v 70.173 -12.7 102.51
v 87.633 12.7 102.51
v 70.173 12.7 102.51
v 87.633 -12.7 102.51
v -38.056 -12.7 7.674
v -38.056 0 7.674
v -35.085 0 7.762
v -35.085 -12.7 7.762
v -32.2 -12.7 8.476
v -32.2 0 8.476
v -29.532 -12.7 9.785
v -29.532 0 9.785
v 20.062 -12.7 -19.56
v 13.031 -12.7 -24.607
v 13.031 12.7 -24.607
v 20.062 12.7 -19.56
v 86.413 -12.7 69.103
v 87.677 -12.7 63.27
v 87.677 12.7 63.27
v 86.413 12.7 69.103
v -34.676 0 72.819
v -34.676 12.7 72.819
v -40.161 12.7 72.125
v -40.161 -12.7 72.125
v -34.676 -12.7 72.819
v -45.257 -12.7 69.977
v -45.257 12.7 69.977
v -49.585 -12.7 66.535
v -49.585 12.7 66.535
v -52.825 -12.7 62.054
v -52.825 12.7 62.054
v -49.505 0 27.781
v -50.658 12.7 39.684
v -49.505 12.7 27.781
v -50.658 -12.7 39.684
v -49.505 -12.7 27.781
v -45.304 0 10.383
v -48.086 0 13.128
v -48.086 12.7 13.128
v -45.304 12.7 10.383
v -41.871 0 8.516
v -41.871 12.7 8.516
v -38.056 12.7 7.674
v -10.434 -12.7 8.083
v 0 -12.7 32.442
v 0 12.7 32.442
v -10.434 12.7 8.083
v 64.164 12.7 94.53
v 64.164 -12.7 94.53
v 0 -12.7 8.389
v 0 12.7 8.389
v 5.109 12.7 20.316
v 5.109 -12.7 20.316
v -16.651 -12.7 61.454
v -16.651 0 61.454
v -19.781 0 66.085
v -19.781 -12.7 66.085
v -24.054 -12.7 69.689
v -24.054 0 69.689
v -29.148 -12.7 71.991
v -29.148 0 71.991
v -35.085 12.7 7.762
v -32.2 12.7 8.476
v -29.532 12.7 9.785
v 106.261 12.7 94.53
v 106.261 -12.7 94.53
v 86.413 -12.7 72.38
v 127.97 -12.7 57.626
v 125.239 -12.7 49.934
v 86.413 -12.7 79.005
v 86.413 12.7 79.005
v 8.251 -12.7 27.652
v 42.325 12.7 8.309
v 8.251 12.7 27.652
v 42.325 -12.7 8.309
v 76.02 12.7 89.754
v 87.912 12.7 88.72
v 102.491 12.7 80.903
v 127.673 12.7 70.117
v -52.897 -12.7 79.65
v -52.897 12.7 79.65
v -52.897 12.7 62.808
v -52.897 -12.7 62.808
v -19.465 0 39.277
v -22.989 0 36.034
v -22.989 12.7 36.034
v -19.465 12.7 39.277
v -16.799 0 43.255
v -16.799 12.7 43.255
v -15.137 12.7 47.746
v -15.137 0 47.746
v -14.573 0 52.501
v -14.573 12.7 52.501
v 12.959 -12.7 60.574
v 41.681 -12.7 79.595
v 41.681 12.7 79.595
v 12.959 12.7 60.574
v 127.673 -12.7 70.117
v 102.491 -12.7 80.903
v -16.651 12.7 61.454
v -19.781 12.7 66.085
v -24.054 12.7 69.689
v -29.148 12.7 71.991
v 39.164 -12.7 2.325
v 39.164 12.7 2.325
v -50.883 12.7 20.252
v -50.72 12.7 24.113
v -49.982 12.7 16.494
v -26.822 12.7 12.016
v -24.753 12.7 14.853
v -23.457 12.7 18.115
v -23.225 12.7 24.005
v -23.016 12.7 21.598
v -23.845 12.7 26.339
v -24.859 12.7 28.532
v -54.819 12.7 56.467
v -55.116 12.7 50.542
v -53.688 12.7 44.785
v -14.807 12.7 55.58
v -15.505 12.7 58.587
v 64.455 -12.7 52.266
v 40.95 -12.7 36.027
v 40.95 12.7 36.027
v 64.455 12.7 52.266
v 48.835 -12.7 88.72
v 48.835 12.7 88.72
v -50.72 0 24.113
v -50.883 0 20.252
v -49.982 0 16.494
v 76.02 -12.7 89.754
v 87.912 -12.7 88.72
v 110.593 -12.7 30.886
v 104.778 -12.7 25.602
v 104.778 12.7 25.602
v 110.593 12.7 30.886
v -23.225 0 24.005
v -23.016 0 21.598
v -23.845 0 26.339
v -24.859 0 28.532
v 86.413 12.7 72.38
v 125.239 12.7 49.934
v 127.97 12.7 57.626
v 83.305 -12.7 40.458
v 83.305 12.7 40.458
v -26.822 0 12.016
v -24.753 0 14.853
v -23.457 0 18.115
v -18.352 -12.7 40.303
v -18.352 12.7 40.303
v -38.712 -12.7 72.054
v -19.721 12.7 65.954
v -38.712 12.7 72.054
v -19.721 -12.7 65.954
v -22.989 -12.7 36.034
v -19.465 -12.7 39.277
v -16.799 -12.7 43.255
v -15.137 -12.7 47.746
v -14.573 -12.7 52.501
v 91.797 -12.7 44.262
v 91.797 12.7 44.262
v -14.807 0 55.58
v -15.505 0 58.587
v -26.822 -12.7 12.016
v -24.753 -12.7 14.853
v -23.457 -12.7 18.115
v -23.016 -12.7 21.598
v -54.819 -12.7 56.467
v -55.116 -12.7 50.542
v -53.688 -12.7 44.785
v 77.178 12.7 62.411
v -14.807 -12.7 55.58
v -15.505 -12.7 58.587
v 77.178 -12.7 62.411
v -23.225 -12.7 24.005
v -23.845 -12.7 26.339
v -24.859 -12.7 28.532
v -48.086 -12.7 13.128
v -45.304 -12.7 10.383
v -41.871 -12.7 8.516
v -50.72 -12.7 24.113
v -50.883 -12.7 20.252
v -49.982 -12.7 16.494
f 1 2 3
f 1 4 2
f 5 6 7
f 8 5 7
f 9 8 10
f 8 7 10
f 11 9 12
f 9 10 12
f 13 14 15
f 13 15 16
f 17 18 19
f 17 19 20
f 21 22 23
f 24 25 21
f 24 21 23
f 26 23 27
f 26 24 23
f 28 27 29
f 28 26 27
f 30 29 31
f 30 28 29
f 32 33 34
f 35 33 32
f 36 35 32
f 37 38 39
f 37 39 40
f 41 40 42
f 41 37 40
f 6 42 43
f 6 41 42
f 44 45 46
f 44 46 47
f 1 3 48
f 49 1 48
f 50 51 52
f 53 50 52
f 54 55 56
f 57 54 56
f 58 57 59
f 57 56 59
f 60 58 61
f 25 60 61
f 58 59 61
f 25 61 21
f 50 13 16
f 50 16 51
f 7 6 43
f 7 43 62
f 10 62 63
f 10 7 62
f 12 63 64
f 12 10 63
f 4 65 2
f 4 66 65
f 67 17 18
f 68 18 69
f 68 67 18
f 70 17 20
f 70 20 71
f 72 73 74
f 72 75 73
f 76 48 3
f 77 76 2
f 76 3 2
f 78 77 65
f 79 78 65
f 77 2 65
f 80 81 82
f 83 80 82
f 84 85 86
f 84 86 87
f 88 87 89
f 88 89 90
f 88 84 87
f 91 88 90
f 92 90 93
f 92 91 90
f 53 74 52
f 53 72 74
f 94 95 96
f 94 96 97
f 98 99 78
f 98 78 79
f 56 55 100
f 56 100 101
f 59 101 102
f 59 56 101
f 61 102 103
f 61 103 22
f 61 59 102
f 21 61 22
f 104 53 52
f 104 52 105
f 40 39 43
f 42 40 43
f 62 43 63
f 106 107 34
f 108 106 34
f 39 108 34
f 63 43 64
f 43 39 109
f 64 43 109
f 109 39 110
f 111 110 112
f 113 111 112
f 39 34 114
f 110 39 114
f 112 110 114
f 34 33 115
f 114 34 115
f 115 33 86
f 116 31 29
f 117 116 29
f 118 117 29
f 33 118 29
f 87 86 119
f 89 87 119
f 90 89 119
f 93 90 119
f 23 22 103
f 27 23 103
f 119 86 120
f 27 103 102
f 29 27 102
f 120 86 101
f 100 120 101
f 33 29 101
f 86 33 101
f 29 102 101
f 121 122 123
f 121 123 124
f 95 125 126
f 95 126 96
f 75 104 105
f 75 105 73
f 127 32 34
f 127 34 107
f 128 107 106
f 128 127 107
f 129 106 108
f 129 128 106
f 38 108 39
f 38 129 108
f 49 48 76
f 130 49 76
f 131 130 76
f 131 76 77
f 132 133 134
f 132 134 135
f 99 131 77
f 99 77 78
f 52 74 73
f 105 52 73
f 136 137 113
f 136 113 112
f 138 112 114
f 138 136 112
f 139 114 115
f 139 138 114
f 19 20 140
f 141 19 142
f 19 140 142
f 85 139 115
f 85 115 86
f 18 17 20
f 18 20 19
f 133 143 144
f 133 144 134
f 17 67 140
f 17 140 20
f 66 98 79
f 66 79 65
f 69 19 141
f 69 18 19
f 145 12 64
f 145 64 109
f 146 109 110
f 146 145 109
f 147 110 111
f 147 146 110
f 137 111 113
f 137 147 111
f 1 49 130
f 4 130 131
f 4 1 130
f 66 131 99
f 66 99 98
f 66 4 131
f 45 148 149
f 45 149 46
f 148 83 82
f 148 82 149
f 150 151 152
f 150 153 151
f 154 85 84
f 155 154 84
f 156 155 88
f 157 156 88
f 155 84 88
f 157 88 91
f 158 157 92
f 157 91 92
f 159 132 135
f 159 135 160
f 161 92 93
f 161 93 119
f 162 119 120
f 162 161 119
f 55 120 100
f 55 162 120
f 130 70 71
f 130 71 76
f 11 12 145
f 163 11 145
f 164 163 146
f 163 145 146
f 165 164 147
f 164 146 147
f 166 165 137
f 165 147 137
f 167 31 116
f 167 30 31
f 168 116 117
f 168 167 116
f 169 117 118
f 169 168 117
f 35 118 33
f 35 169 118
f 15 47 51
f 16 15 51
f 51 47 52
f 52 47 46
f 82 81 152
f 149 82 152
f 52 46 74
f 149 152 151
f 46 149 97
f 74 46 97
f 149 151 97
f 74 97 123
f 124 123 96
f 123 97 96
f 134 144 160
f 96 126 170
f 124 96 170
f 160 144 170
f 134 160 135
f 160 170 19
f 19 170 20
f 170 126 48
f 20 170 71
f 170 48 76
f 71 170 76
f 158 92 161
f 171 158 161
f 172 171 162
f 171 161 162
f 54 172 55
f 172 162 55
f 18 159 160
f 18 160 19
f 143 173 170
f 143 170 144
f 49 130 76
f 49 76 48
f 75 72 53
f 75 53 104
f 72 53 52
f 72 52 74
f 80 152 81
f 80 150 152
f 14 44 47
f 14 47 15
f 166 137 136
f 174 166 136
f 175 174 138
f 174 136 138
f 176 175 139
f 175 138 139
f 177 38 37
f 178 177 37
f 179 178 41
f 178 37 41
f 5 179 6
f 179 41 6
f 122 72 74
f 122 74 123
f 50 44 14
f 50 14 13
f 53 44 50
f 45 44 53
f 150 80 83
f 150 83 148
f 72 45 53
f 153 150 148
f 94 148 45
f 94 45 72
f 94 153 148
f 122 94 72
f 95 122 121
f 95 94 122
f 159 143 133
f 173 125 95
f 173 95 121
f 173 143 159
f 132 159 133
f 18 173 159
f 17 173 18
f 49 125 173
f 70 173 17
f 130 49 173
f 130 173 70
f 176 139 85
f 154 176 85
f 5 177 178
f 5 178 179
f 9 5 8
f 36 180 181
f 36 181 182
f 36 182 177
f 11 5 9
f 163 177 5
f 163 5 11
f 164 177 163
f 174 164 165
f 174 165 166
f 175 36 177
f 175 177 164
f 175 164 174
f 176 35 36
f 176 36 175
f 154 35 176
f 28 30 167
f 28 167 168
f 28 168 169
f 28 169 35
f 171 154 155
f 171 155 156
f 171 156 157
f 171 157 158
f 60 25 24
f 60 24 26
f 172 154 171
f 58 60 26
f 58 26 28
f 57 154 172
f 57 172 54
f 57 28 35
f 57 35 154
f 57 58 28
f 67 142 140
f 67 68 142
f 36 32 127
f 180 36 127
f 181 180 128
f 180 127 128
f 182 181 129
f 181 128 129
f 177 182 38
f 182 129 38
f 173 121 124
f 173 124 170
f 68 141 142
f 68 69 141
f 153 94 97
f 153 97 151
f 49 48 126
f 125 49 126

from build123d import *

# Parameters (mm, degrees)
F0_W        = 150.6141573191
F0_H        = 79.405464232
F1_DEPTH    = 63.5
F2_T1_DEPTH = 658.6141573191
F3_T1_DEPTH = 718.5752538832
F7_DEPTH    = 12.7
F9_DEPTH    = 12.7
F10_DEPTH   = 12.7


# Not quite as in the source:
# - a fillet or chamfer that OpenCascade refuses, or shapes differently, is made with other operations: its cross-section is extruded or revolved along the edge and cut away or added


with BuildPart() as f1:
    # F0 (on Front) → F1 (new body, symmetric)
    with BuildSketch(Plane.XZ):
        with Locations((-10.1514682174, 0)):
            Rectangle(F0_W, F0_H)
    extrude(amount=F1_DEPTH, both=True)

    # F2: fillet of radius 101.6 on 2 edges, made by hand

    # F2_s2 → F2_t1 (cut)
    with BuildSketch(Plane.YZ.offset(-339.4585468769)):
        with BuildLine():
            ThreePointArc((-38.1, -39.702732116), (33.7420489686, -9.9447810845), (63.5, 61.897267884))
            Line((63.5, 61.897267884), (63.5, -39.702732116))
            Line((63.5, -39.702732116), (-38.1, -39.702732116))
        make_face()
        with BuildLine():
            ThreePointArc((38.1, -39.702732116), (-33.7420489686, -9.9447810845), (-63.5, 61.897267884))
            Line((-63.5, 61.897267884), (-63.5, -39.702732116))
            Line((-63.5, -39.702732116), (38.1, -39.702732116))
        make_face()
    extrude(amount=F2_T1_DEPTH, mode=Mode.SUBTRACT)

    # F3: fillet of radius 63.5 on 1 edges, made by hand

    # F3_s2 → F3_t1 (cut)
    with BuildSketch(Plane.YZ.offset(-369.439095159)):
        with BuildLine():
            ThreePointArc((-63.5, 61.8972269458), (0, -1.6027474678), (63.5, 61.8972269458))
            ThreePointArc((63.5, 61.8972269458), (46.1422582324, 5.1011242834), (0, -32.2884529021))
            ThreePointArc((0, -32.2884529021), (-46.1422582324, 5.1011242834), (-63.5, 61.8972269458))
        make_face()
    extrude(amount=F3_T1_DEPTH, mode=Mode.SUBTRACT)


with BuildPart() as f1b:
    # F0 (on Front) → F1, piece 2 (new body, symmetric)
    with BuildSketch(Plane.XZ):
        Polygon((31.3350483775, 122.2248598933), (31.3350483775, 93.6296462137), (77.3309990764, 97.4231287837), (73.4557332426, 72.6213976741), (123.3269497752, 72.6213976741), (123.3269497752, 122.2248598933), align=None)
        Polygon((77.3309990764, 97.4231287837), (31.3350483775, 93.6296462137), (31.3350483775, 72.6213976741), (73.4557332426, 72.6213976741), align=None)
    extrude(amount=F1_DEPTH, both=True)


with BuildPart() as f7:
    # F6 (on Front) → F7 (new body, symmetric)
    with BuildSketch(Plane.XZ):
        with BuildLine():
            ThreePointArc((-36.6087691493, 35.5593333212), (-32.619344121, 34.8654693263), (-28.9966608866, 33.0562912025))
            ThreePointArc((-28.9966608866, 33.0562912025), (-25.8689313613, 34.2954979773), (-22.9885519546, 36.0338132212))
            Line((-22.9885519546, 36.0338132212), (-16.6514110853, 61.4541698217))
            ThreePointArc((-16.6514110853, 61.4541698217), (-24.0542736375, 69.6886763572), (-34.6755571583, 72.818821437))
            Line((-34.6755571583, 72.818821437), (-36.6087691493, 35.5593333212))
        make_face()
        with BuildLine():
            ThreePointArc((-43.3512285275, 34.0273458631), (-40.0763049725, 35.2171943654), (-36.6087691493, 35.5593333212))
            Line((-36.6087691493, 35.5593333212), (-34.6755571583, 72.818821437))
            ThreePointArc((-34.6755571583, 72.818821437), (-45.2570577506, 69.977044348), (-52.8245618349, 62.05386735))
            Line((-52.8245618349, 62.05386735), (-50.6579192972, 39.6844671989))
            ThreePointArc((-50.6579192972, 39.6844671989), (-47.3304404617, 36.4350200118), (-43.3512285275, 34.0273458631))
        make_face()
        with BuildLine():
            ThreePointArc((-48.0856804005, 13.1275062956), (-43.6534019652, 9.3288594795), (-38.0556191372, 7.6736745436))
            Line((-38.0556191372, 7.6736745436), (-36.779418711, 32.2703431094))
            ThreePointArc((-36.779418711, 32.2703431094), (-40.1393756094, 32.8718639323), (-43.3512285275, 34.0273458631))
            ThreePointArc((-43.3512285275, 34.0273458631), (-46.9310511113, 31.3995108928), (-49.5049525713, 27.7807158395))
            Line((-49.5049525713, 27.7807158395), (-48.0856804005, 13.1275062956))
        make_face()
        with BuildLine():
            Line((-29.5321783365, 9.785175307), (-24.8586907719, 28.5320712513))
            ThreePointArc((-24.8586907719, 28.5320712513), (-26.6763399678, 31.0240595915), (-28.9966608866, 33.0562912025))
            ThreePointArc((-28.9966608866, 33.0562912025), (-32.8498609048, 32.2852551832), (-36.779418711, 32.2703431094))
            Line((-36.779418711, 32.2703431094), (-38.0556191372, 7.6736745436))
            ThreePointArc((-38.0556191372, 7.6736745436), (-33.6236322142, 8.0421144346), (-29.5321783365, 9.785175307))
        make_face()
        with BuildLine():
            Line((-16.6514110853, 61.4541698217), (-22.9885519546, 36.0338132212))
            ThreePointArc((-22.9885519546, 36.0338132212), (-16.7985245944, 43.2545420146), (-14.5726177745, 52.5012009711))
            ThreePointArc((-14.5726177745, 52.5012009711), (-15.0991379608, 57.0967703828), (-16.6514110853, 61.4541698217))
        make_face()
        with BuildLine():
            ThreePointArc((-36.779418711, 32.2703431094), (-32.8498609048, 32.2852551832), (-28.9966608866, 33.0562912025))
            ThreePointArc((-28.9966608866, 33.0562912025), (-32.619344121, 34.8654693263), (-36.6087691493, 35.5593333212))
            Line((-36.6087691493, 35.5593333212), (-36.779418711, 32.2703431094))
        make_face()
        with BuildLine():
            ThreePointArc((-52.8245618349, 62.05386735), (-55.1155078554, 50.5423444275), (-50.6579192972, 39.6844671989))
            Line((-50.6579192972, 39.6844671989), (-52.8245618349, 62.05386735))
        make_face()
        with BuildLine():
            Line((-36.779418711, 32.2703431094), (-36.6087691493, 35.5593333212))
            ThreePointArc((-36.6087691493, 35.5593333212), (-40.0763049725, 35.2171943654), (-43.3512285275, 34.0273458631))
            ThreePointArc((-43.3512285275, 34.0273458631), (-40.1393756094, 32.8718639323), (-36.779418711, 32.2703431094))
        make_face()
        with BuildLine():
            ThreePointArc((-49.5049525713, 27.7807158395), (-46.9310511113, 31.3995108928), (-43.3512285275, 34.0273458631))
            ThreePointArc((-43.3512285275, 34.0273458631), (-47.3304404617, 36.4350200118), (-50.6579192972, 39.6844671989))
            Line((-50.6579192972, 39.6844671989), (-49.5049525713, 27.7807158395))
        make_face()
        with BuildLine():
            ThreePointArc((-28.9966608866, 33.0562912025), (-26.6763399678, 31.0240595915), (-24.8586907719, 28.5320712513))
            Line((-24.8586907719, 28.5320712513), (-22.9885519546, 36.0338132212))
            ThreePointArc((-22.9885519546, 36.0338132212), (-25.8689313613, 34.2954979773), (-28.9966608866, 33.0562912025))
        make_face()
        with BuildLine():
            ThreePointArc((-29.5321783365, 9.785175307), (-24.7530043734, 14.8527299858), (-23.0159053765, 21.5983286448))
            ThreePointArc((-23.0159053765, 21.5983286448), (-23.4844617139, 25.1855505694), (-24.8586907719, 28.5320712513))
            Line((-24.8586907719, 28.5320712513), (-29.5321783365, 9.785175307))
        make_face()
        with BuildLine():
            ThreePointArc((-49.5049525713, 27.7807158395), (-50.882832593, 20.251919629), (-48.0856804005, 13.1275062956))
            Line((-48.0856804005, 13.1275062956), (-49.5049525713, 27.7807158395))
        make_face()
    extrude(amount=F7_DEPTH, both=True)


with BuildPart() as f9:
    # F8 (on Front) → F9 (new body, symmetric)
    with BuildSketch(Plane.XZ):
        Polygon((70.1734498143, 102.5099307299), (64.1641393304, 94.530403614), (76.0201886296, 89.753575623), (87.9124104977, 88.7197852135), (102.4909329914, 80.9034005742), (127.6726275682, 70.1168328524), (106.2612786499, 94.530403614), (87.6327380538, 102.5099307299), align=None)
    extrude(amount=F9_DEPTH, both=True)


with BuildPart() as f9b:
    # F8 (on Front) → F9, piece 2 (new body, symmetric)
    with BuildSketch(Plane.XZ):
        Polygon((127.969712019, 57.6258897781), (86.4127874374, 72.3803937435), (86.4127874374, 69.103308022), (87.6771708107, 63.2699279244), (125.2387401997, 49.9339476978), align=None)
    extrude(amount=F9_DEPTH, both=True)


with BuildPart() as f9c:
    # F8 (on Front) → F9, piece 3 (new body, symmetric)
    with BuildSketch(Plane.XZ):
        Polygon((8.2513917411, 27.6518290569), (5.10901674, 20.3158228717), (39.1638986766, 2.32507498), (42.3252065188, 8.309148904), align=None)
    extrude(amount=F9_DEPTH, both=True)


with BuildPart() as f10:
    # F8 (on Front) → F10 (new body, symmetric)
    with BuildSketch(Plane.XZ):
        Polygon((-52.8965368867, 79.6501561999), (-52.8965368867, 62.8078132868), (-18.3518156409, 40.3029546142), (0, 32.4419625103), (-10.4339636263, 8.0834369776), (13.0310822278, -24.6068127453), (20.0616800202, -19.5602529613), (0, 8.388609095), (5.10901674, 20.3158228717), (8.2513917411, 27.6518290569), (40.949832648, 36.0271781683), (64.455486834, 52.2657185793), (77.1777108312, 62.4108165503), (83.3045616746, 40.4580123723), (104.7781407833, 25.6019085646), (110.5931252241, 30.8859813958), (91.7972102761, 44.2616455257), (87.6771708107, 63.2699279244), (86.4127874374, 69.103308022), (86.4127874374, 72.3803937435), (86.4127874374, 79.0046826005), (76.0201886296, 89.753575623), (64.1641393304, 94.530403614), (48.835285008, 88.7197852135), (41.6805818677, 79.5953571796), (12.9594327882, 60.5743080378), (-19.7210758924, 65.9544691443), (-38.7121960521, 72.0541030169), align=None)
    extrude(amount=F10_DEPTH, both=True)


solid = Compound([f7.part, f9.part, f9b.part, f9c.part, f10.part])
